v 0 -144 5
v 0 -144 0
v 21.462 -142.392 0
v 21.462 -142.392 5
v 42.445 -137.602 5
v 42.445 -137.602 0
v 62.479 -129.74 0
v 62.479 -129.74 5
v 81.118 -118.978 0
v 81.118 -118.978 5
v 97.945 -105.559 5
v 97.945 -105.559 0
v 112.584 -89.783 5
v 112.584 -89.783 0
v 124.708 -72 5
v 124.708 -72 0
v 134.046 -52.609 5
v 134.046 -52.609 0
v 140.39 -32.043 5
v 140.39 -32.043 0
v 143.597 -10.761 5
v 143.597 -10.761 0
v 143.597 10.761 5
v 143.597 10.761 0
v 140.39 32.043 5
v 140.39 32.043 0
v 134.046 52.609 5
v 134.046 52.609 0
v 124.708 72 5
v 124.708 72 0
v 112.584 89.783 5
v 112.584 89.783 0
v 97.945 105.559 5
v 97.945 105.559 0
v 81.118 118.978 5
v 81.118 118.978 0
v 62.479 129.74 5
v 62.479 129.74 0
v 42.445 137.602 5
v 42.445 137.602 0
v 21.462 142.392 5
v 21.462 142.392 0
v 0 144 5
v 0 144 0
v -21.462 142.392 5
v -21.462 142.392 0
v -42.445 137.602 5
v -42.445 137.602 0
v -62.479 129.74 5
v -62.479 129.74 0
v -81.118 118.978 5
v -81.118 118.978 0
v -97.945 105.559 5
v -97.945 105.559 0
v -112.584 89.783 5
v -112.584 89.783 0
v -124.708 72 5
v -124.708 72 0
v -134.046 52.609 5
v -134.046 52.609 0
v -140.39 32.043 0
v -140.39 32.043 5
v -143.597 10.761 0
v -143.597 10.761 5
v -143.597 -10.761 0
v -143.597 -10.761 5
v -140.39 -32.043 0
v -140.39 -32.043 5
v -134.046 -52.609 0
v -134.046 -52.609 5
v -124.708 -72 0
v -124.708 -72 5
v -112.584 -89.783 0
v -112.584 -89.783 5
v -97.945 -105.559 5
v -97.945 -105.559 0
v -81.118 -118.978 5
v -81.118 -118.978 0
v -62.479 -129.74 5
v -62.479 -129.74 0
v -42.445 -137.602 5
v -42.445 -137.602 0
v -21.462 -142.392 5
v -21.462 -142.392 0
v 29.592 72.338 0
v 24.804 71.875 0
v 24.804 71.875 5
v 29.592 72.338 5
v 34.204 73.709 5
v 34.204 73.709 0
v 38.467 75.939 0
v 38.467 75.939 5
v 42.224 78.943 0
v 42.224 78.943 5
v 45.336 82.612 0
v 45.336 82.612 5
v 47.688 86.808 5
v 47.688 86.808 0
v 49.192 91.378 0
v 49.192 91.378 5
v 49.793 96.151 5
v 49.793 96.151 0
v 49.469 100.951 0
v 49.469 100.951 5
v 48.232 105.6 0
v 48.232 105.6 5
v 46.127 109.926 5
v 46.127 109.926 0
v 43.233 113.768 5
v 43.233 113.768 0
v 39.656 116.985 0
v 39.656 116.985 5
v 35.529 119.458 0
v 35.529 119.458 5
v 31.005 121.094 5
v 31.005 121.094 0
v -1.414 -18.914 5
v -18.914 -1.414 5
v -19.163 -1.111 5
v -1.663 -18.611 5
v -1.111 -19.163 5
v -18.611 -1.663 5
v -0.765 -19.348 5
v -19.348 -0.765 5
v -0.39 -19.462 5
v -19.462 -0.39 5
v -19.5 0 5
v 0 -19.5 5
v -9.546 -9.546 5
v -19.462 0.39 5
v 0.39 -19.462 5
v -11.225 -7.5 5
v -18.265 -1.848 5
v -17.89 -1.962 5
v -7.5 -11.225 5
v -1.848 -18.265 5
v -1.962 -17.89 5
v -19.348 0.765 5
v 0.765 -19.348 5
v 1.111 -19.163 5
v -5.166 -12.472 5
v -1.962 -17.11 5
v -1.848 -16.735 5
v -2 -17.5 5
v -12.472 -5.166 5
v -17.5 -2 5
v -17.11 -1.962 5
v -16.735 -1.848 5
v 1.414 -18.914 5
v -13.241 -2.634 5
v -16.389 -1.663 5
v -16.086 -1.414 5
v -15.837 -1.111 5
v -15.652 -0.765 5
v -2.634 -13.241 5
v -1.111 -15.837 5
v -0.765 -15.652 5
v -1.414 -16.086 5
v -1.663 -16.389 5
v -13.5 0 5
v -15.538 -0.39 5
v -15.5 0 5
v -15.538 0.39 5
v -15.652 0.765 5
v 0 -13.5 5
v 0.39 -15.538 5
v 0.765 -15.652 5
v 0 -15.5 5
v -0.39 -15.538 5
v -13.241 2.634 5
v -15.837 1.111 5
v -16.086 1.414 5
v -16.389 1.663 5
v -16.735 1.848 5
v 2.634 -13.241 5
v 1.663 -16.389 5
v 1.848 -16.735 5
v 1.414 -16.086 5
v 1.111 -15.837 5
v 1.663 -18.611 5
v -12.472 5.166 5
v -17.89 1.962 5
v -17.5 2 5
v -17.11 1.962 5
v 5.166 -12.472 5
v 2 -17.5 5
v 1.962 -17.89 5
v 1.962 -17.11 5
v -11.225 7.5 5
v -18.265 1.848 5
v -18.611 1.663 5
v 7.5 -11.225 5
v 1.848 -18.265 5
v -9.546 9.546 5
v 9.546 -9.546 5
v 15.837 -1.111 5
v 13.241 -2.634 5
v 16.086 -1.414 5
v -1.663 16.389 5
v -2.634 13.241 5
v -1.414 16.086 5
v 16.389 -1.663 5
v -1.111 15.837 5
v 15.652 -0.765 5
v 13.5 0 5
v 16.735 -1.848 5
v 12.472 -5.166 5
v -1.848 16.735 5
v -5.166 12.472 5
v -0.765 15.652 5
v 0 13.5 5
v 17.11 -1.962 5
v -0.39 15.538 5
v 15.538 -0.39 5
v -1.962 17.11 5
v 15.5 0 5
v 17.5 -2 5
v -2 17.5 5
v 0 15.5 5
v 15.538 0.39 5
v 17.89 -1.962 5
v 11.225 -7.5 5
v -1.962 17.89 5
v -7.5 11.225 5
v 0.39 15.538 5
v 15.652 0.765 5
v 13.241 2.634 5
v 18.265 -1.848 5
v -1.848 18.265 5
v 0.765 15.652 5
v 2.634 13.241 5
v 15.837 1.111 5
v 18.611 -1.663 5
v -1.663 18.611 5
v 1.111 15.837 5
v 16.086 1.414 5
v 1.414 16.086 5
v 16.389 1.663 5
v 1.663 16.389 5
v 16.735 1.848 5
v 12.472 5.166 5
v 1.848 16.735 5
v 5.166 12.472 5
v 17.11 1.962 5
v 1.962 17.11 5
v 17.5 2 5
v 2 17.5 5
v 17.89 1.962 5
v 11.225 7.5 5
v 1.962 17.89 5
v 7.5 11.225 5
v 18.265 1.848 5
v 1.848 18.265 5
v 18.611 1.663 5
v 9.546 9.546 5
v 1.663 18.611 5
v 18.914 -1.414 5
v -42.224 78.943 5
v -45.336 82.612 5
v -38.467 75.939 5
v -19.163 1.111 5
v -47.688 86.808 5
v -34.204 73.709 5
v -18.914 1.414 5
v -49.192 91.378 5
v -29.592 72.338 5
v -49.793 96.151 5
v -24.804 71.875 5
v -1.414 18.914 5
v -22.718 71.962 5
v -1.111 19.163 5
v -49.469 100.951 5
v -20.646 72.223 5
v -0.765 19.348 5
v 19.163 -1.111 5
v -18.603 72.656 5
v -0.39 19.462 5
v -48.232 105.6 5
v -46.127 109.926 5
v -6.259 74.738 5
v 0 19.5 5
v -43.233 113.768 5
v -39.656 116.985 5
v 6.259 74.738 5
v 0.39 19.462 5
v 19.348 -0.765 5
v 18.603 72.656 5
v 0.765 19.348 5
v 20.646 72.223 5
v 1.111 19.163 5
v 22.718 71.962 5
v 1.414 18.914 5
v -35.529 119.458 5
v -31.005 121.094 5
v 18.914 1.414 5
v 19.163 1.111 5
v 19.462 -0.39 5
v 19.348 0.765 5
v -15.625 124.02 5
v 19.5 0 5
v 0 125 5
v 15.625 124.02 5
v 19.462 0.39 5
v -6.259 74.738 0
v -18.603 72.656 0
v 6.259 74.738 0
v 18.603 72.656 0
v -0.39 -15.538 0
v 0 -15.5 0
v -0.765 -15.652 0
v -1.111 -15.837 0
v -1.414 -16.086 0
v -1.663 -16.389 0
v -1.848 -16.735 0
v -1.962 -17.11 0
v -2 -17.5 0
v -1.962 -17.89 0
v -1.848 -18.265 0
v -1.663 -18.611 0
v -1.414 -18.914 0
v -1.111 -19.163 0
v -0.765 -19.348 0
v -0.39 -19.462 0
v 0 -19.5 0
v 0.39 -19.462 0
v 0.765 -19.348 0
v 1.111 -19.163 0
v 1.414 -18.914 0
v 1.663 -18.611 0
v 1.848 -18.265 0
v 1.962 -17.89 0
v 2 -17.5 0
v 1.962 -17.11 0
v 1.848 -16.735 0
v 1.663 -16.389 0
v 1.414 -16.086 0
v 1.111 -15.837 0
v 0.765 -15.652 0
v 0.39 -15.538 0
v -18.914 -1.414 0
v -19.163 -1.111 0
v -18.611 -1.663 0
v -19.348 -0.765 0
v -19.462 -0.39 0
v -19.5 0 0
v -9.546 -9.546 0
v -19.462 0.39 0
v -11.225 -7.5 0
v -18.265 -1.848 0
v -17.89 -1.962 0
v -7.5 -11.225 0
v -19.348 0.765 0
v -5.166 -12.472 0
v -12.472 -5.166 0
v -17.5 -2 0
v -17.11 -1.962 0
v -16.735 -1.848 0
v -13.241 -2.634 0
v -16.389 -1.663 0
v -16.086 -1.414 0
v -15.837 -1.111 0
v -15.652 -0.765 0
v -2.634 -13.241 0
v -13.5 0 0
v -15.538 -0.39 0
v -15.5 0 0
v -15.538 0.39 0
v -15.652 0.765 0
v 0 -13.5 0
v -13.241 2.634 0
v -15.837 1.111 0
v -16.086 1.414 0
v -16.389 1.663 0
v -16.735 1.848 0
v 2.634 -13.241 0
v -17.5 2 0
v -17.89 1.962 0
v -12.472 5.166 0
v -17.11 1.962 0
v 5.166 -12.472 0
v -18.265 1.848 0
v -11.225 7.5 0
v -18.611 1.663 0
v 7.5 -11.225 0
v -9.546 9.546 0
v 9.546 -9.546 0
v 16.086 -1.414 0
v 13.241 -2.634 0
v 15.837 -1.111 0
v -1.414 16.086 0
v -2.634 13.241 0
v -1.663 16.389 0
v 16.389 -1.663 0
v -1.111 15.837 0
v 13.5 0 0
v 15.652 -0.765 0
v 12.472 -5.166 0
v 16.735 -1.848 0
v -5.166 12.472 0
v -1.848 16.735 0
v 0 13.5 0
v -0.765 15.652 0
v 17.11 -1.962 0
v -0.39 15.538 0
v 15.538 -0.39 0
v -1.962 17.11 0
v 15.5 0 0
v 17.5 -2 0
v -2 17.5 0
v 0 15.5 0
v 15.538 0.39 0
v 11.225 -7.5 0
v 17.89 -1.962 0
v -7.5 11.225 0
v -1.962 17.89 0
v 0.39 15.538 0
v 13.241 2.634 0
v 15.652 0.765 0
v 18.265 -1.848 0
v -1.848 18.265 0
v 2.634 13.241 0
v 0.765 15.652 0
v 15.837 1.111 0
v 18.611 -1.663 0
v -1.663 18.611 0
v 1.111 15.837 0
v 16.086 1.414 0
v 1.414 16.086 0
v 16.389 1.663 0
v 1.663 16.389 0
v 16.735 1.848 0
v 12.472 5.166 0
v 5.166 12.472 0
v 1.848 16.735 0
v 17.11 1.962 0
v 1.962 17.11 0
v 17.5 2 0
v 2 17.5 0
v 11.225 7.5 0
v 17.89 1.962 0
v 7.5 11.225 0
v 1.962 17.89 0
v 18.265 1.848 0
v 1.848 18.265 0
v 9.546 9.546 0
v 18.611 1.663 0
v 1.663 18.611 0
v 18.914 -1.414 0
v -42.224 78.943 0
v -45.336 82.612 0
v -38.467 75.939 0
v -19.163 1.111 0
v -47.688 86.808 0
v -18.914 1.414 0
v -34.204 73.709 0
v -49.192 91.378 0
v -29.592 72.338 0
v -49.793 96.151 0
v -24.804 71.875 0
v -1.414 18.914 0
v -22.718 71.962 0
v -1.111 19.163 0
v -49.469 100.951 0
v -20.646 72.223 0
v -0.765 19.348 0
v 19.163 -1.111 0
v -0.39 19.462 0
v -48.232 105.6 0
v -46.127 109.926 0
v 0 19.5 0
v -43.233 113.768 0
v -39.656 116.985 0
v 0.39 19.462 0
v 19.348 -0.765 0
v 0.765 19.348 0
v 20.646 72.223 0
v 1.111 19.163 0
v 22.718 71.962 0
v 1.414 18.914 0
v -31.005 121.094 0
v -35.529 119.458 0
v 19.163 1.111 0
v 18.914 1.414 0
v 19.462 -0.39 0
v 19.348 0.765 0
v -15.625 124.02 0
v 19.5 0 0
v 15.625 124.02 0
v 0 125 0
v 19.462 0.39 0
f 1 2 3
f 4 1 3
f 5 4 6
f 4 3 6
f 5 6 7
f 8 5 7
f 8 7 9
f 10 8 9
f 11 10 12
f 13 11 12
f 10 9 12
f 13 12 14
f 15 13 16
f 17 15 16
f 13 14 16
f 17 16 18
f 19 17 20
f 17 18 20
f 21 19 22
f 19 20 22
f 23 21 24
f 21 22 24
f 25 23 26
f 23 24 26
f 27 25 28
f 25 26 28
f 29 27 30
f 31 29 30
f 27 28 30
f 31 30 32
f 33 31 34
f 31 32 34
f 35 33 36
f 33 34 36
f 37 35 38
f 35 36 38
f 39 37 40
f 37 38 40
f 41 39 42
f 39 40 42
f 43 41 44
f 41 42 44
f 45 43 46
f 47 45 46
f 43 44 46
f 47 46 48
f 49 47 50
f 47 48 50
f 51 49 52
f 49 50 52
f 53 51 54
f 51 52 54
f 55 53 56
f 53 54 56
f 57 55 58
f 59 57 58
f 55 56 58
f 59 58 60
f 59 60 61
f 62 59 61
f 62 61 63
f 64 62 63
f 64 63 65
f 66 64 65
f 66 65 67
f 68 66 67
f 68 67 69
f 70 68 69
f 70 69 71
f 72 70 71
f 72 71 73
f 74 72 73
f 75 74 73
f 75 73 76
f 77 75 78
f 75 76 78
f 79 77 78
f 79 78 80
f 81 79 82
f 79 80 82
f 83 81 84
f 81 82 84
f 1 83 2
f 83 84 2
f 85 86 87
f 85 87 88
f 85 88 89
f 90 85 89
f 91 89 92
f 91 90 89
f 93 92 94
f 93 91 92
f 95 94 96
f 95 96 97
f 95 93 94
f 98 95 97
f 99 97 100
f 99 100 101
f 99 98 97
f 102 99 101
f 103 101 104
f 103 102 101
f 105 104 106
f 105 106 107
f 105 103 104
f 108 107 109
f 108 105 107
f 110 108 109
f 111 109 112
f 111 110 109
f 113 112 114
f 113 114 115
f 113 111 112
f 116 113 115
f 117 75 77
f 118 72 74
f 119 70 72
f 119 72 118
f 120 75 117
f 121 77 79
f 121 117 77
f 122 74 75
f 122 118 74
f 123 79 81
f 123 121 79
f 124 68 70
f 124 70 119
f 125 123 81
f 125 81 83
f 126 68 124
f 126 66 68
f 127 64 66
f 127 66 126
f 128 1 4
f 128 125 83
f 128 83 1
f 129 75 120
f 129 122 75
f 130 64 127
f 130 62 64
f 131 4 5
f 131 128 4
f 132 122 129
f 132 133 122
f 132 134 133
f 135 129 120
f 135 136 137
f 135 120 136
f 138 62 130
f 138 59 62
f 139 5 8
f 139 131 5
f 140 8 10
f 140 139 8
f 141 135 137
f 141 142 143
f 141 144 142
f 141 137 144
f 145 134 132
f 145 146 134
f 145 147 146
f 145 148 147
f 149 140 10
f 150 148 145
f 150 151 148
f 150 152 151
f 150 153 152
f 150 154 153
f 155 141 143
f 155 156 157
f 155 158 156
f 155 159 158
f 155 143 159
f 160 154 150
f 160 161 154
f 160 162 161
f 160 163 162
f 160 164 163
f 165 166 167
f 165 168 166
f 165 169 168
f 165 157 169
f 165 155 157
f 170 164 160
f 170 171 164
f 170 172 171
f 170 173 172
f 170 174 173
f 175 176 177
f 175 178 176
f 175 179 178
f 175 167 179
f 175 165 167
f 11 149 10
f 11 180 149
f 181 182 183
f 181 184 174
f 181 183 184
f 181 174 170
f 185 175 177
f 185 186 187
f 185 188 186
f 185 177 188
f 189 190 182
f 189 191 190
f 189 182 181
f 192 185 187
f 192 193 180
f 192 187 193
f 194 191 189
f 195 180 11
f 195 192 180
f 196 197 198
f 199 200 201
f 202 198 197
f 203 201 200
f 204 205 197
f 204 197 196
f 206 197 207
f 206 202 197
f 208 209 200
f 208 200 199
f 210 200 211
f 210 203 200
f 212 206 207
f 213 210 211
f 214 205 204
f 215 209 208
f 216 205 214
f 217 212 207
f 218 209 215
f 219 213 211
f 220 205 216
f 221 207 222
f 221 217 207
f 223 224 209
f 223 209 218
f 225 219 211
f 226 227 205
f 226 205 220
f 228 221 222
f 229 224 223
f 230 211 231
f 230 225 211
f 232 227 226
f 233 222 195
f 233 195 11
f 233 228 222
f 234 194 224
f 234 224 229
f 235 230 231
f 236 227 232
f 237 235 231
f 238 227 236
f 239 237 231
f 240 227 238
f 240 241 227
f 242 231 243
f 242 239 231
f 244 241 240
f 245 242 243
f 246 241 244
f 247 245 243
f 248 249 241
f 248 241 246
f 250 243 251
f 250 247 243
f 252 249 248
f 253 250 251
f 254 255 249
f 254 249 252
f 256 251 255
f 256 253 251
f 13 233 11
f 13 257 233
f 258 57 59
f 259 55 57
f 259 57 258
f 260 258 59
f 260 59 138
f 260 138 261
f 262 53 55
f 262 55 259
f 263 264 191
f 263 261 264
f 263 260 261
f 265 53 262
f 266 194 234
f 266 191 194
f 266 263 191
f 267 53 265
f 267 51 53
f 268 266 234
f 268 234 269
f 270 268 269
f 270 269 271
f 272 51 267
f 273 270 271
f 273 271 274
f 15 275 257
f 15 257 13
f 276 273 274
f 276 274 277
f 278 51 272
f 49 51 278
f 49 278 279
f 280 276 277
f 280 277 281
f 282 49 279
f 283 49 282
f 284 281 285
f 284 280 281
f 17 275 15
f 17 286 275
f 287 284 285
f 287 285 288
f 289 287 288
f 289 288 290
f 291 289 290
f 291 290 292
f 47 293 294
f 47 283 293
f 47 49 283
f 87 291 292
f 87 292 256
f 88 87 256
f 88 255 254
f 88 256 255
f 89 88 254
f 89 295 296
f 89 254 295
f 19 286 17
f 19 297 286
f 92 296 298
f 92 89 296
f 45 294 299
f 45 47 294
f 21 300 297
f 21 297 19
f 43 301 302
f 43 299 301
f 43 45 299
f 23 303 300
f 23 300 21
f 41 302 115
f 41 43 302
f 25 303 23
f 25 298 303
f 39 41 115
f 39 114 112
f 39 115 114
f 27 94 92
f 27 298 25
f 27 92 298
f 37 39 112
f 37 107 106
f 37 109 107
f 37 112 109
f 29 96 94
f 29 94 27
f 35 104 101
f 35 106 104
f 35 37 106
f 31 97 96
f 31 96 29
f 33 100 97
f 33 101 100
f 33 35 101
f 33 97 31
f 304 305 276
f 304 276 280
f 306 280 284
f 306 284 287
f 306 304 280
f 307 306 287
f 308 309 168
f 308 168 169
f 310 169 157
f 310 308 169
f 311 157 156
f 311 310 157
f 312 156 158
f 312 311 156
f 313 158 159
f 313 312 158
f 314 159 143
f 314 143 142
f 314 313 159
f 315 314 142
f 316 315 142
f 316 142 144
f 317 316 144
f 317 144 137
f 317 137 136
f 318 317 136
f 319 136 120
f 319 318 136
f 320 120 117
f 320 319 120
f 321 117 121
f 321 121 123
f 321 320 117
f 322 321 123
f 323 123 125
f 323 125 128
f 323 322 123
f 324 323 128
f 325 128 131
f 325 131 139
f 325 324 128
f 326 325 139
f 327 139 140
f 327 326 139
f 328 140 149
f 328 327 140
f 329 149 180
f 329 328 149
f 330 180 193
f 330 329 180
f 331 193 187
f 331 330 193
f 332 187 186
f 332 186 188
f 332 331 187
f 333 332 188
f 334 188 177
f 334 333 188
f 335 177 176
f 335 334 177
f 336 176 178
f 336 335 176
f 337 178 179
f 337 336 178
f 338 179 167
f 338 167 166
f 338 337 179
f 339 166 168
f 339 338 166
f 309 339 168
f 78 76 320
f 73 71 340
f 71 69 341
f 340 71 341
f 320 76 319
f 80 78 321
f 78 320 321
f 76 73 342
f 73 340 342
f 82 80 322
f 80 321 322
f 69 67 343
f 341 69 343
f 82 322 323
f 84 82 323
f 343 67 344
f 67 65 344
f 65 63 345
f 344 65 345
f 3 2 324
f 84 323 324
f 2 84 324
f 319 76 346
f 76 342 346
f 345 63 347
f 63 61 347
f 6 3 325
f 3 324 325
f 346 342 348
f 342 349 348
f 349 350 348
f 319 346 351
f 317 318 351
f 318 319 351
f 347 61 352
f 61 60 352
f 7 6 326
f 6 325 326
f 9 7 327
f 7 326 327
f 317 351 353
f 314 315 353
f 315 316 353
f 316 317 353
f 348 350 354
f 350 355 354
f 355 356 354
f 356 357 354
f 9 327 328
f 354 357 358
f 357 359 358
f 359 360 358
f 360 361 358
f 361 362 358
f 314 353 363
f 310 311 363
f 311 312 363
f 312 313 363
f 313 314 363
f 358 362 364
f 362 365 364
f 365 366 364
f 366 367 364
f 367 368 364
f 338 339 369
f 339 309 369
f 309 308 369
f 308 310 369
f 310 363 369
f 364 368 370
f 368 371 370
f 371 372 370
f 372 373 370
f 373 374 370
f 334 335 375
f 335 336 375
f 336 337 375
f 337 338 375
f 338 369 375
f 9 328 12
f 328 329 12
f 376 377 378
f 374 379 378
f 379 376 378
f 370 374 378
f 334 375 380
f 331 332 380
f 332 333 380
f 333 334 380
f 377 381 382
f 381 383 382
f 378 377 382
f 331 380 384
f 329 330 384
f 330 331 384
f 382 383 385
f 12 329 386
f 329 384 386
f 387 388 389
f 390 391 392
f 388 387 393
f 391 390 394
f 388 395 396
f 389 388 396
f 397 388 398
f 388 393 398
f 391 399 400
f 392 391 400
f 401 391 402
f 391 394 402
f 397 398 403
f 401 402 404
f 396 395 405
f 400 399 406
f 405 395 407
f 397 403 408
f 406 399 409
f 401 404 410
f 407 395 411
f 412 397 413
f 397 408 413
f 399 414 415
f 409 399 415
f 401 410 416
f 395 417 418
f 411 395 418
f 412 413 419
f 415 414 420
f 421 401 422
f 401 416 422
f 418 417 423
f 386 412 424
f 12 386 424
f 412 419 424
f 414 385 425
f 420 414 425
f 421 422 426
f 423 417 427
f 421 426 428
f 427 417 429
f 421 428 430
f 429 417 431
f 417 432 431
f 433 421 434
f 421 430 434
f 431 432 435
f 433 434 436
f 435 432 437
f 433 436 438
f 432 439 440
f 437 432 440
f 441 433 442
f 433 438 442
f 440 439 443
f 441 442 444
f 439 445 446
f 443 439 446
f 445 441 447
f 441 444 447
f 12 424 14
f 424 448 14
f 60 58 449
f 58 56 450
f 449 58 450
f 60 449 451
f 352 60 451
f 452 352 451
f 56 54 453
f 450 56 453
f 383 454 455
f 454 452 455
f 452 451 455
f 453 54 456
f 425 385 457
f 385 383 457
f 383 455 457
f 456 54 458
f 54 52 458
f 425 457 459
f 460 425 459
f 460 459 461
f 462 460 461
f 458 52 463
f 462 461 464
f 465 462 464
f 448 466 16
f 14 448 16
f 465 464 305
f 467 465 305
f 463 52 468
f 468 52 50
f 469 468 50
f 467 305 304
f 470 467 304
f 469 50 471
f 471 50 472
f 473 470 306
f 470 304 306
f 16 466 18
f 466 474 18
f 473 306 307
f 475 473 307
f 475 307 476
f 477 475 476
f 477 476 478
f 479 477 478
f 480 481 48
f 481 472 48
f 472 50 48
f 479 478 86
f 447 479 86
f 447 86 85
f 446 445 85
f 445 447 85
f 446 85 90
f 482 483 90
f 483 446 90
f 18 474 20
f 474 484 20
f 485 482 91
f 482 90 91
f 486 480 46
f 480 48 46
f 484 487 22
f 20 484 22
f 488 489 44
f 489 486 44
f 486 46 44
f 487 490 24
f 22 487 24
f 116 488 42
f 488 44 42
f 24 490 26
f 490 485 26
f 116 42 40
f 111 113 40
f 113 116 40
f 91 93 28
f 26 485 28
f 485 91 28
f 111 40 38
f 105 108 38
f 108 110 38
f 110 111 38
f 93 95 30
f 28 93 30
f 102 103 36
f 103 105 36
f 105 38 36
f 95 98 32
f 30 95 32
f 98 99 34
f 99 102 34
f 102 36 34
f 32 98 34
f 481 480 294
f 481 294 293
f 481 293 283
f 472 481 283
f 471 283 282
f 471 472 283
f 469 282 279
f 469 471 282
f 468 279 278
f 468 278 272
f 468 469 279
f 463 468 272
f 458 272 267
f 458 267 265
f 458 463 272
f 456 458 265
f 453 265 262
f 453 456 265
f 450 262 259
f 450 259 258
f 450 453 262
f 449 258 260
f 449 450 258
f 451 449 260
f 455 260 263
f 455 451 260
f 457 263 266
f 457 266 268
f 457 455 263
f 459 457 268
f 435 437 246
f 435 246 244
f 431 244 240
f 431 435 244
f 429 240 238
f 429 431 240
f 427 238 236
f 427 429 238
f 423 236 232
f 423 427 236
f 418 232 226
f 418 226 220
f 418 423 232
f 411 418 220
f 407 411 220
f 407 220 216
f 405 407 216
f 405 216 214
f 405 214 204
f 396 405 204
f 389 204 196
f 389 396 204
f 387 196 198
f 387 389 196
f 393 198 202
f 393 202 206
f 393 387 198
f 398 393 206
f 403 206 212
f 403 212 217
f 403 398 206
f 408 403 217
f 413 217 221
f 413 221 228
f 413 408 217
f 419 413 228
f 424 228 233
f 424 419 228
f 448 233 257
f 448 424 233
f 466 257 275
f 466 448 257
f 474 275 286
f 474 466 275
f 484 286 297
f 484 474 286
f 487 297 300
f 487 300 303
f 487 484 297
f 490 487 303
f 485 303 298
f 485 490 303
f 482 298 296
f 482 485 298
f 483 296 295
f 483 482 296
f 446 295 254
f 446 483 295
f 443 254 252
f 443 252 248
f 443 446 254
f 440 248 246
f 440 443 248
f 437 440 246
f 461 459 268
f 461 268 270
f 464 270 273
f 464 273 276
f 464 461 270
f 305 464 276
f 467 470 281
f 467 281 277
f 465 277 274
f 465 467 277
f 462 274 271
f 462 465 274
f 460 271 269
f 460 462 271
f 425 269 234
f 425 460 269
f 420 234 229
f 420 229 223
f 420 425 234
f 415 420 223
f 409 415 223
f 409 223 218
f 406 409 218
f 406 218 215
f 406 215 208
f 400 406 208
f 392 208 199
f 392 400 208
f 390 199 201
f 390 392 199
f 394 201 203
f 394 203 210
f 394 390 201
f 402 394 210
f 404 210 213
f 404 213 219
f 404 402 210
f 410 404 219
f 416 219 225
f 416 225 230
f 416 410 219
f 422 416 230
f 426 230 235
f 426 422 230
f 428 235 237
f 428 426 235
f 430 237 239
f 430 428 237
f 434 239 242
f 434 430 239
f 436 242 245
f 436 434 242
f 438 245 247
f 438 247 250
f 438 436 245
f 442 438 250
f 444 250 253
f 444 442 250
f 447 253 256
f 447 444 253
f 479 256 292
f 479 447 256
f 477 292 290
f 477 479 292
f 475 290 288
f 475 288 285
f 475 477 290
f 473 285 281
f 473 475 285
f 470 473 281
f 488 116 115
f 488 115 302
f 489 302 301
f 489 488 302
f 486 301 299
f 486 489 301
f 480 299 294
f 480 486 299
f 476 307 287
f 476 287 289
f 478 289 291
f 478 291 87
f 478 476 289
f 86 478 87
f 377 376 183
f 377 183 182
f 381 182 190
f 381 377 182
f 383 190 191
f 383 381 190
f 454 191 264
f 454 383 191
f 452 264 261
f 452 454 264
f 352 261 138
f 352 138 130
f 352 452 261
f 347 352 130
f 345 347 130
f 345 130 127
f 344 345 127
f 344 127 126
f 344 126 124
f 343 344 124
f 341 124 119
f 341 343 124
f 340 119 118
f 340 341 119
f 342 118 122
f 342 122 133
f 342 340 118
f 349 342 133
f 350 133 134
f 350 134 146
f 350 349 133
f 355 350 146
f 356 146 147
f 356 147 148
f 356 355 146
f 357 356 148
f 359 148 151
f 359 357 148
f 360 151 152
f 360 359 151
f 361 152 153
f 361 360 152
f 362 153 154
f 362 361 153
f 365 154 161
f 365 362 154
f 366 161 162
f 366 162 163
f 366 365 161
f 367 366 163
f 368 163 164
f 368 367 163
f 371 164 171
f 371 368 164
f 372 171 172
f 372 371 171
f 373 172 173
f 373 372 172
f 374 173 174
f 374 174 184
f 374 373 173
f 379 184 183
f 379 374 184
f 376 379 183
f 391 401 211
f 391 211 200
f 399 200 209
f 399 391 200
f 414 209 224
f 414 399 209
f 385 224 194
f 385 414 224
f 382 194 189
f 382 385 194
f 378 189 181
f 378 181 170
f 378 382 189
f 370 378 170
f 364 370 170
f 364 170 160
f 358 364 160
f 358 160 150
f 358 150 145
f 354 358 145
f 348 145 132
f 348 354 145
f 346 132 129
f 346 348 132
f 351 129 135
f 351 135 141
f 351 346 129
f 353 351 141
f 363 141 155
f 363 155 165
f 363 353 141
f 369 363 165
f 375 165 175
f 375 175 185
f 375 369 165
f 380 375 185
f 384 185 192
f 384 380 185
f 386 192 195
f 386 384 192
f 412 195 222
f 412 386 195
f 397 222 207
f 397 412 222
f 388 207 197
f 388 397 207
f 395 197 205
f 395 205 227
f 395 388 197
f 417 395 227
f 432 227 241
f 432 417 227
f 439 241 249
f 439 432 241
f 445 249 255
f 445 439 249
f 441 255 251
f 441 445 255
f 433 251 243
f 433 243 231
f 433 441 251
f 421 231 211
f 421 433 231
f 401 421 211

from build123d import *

# Parameters (mm, degrees)
EXTRUDE_1_DEPTH = 5


with BuildPart() as part:
    # 草图1 → 凸台-拉伸1 (new body)
    with BuildSketch(Plane.XY):
        with BuildLine():
            ThreePointArc((0, 144), (-144, 0), (0, -144))
            ThreePointArc((0, -144), (144, 0), (0, 144))
        make_face()
        with BuildLine():
            ThreePointArc((31.004898177, 121.09375), (0, 125), (-31.004898177, 121.09375))
            ThreePointArc((-31.004898177, 121.09375), (-49.607837082, 93.75), (-24.803918541, 71.875))
            ThreePointArc((-24.803918541, 71.875), (-21.678918541, 72.071081459), (-18.602938906, 72.65625))
            ThreePointArc((-18.602938906, 72.65625), (0, 75), (18.602938906, 72.65625))
            ThreePointArc((18.602938906, 72.65625), (21.678918541, 72.071081459), (24.803918541, 71.875))
            ThreePointArc((24.803918541, 71.875), (49.607837082, 93.75), (31.004898177, 121.09375))
        make_face(mode=Mode.SUBTRACT)
        with BuildLine():
            ThreePointArc((0, -13.5), (13.5, 0), (0, 13.5))
            ThreePointArc((0, 13.5), (-13.5, 0), (0, -13.5))
        make_face(mode=Mode.SUBTRACT)
        with BuildLine():
            ThreePointArc((17.5, -2), (19.5, 0), (17.5, 2))
            ThreePointArc((17.5, 2), (15.5, 0), (17.5, -2))
        make_face(mode=Mode.SUBTRACT)
        with BuildLine():
            ThreePointArc((0, -19.5), (2, -17.5), (0, -15.5))
            ThreePointArc((0, -15.5), (-2, -17.5), (0, -19.5))
        make_face(mode=Mode.SUBTRACT)
        with BuildLine():
            ThreePointArc((-17.5, -2), (-15.5, 0), (-17.5, 2))
            ThreePointArc((-17.5, 2), (-19.5, 0), (-17.5, -2))
        make_face(mode=Mode.SUBTRACT)
        with BuildLine():
            ThreePointArc((0, 15.5), (2, 17.5), (0, 19.5))
            ThreePointArc((0, 19.5), (-2, 17.5), (0, 15.5))
        make_face(mode=Mode.SUBTRACT)
    extrude(amount=EXTRUDE_1_DEPTH)


solid = part.part
